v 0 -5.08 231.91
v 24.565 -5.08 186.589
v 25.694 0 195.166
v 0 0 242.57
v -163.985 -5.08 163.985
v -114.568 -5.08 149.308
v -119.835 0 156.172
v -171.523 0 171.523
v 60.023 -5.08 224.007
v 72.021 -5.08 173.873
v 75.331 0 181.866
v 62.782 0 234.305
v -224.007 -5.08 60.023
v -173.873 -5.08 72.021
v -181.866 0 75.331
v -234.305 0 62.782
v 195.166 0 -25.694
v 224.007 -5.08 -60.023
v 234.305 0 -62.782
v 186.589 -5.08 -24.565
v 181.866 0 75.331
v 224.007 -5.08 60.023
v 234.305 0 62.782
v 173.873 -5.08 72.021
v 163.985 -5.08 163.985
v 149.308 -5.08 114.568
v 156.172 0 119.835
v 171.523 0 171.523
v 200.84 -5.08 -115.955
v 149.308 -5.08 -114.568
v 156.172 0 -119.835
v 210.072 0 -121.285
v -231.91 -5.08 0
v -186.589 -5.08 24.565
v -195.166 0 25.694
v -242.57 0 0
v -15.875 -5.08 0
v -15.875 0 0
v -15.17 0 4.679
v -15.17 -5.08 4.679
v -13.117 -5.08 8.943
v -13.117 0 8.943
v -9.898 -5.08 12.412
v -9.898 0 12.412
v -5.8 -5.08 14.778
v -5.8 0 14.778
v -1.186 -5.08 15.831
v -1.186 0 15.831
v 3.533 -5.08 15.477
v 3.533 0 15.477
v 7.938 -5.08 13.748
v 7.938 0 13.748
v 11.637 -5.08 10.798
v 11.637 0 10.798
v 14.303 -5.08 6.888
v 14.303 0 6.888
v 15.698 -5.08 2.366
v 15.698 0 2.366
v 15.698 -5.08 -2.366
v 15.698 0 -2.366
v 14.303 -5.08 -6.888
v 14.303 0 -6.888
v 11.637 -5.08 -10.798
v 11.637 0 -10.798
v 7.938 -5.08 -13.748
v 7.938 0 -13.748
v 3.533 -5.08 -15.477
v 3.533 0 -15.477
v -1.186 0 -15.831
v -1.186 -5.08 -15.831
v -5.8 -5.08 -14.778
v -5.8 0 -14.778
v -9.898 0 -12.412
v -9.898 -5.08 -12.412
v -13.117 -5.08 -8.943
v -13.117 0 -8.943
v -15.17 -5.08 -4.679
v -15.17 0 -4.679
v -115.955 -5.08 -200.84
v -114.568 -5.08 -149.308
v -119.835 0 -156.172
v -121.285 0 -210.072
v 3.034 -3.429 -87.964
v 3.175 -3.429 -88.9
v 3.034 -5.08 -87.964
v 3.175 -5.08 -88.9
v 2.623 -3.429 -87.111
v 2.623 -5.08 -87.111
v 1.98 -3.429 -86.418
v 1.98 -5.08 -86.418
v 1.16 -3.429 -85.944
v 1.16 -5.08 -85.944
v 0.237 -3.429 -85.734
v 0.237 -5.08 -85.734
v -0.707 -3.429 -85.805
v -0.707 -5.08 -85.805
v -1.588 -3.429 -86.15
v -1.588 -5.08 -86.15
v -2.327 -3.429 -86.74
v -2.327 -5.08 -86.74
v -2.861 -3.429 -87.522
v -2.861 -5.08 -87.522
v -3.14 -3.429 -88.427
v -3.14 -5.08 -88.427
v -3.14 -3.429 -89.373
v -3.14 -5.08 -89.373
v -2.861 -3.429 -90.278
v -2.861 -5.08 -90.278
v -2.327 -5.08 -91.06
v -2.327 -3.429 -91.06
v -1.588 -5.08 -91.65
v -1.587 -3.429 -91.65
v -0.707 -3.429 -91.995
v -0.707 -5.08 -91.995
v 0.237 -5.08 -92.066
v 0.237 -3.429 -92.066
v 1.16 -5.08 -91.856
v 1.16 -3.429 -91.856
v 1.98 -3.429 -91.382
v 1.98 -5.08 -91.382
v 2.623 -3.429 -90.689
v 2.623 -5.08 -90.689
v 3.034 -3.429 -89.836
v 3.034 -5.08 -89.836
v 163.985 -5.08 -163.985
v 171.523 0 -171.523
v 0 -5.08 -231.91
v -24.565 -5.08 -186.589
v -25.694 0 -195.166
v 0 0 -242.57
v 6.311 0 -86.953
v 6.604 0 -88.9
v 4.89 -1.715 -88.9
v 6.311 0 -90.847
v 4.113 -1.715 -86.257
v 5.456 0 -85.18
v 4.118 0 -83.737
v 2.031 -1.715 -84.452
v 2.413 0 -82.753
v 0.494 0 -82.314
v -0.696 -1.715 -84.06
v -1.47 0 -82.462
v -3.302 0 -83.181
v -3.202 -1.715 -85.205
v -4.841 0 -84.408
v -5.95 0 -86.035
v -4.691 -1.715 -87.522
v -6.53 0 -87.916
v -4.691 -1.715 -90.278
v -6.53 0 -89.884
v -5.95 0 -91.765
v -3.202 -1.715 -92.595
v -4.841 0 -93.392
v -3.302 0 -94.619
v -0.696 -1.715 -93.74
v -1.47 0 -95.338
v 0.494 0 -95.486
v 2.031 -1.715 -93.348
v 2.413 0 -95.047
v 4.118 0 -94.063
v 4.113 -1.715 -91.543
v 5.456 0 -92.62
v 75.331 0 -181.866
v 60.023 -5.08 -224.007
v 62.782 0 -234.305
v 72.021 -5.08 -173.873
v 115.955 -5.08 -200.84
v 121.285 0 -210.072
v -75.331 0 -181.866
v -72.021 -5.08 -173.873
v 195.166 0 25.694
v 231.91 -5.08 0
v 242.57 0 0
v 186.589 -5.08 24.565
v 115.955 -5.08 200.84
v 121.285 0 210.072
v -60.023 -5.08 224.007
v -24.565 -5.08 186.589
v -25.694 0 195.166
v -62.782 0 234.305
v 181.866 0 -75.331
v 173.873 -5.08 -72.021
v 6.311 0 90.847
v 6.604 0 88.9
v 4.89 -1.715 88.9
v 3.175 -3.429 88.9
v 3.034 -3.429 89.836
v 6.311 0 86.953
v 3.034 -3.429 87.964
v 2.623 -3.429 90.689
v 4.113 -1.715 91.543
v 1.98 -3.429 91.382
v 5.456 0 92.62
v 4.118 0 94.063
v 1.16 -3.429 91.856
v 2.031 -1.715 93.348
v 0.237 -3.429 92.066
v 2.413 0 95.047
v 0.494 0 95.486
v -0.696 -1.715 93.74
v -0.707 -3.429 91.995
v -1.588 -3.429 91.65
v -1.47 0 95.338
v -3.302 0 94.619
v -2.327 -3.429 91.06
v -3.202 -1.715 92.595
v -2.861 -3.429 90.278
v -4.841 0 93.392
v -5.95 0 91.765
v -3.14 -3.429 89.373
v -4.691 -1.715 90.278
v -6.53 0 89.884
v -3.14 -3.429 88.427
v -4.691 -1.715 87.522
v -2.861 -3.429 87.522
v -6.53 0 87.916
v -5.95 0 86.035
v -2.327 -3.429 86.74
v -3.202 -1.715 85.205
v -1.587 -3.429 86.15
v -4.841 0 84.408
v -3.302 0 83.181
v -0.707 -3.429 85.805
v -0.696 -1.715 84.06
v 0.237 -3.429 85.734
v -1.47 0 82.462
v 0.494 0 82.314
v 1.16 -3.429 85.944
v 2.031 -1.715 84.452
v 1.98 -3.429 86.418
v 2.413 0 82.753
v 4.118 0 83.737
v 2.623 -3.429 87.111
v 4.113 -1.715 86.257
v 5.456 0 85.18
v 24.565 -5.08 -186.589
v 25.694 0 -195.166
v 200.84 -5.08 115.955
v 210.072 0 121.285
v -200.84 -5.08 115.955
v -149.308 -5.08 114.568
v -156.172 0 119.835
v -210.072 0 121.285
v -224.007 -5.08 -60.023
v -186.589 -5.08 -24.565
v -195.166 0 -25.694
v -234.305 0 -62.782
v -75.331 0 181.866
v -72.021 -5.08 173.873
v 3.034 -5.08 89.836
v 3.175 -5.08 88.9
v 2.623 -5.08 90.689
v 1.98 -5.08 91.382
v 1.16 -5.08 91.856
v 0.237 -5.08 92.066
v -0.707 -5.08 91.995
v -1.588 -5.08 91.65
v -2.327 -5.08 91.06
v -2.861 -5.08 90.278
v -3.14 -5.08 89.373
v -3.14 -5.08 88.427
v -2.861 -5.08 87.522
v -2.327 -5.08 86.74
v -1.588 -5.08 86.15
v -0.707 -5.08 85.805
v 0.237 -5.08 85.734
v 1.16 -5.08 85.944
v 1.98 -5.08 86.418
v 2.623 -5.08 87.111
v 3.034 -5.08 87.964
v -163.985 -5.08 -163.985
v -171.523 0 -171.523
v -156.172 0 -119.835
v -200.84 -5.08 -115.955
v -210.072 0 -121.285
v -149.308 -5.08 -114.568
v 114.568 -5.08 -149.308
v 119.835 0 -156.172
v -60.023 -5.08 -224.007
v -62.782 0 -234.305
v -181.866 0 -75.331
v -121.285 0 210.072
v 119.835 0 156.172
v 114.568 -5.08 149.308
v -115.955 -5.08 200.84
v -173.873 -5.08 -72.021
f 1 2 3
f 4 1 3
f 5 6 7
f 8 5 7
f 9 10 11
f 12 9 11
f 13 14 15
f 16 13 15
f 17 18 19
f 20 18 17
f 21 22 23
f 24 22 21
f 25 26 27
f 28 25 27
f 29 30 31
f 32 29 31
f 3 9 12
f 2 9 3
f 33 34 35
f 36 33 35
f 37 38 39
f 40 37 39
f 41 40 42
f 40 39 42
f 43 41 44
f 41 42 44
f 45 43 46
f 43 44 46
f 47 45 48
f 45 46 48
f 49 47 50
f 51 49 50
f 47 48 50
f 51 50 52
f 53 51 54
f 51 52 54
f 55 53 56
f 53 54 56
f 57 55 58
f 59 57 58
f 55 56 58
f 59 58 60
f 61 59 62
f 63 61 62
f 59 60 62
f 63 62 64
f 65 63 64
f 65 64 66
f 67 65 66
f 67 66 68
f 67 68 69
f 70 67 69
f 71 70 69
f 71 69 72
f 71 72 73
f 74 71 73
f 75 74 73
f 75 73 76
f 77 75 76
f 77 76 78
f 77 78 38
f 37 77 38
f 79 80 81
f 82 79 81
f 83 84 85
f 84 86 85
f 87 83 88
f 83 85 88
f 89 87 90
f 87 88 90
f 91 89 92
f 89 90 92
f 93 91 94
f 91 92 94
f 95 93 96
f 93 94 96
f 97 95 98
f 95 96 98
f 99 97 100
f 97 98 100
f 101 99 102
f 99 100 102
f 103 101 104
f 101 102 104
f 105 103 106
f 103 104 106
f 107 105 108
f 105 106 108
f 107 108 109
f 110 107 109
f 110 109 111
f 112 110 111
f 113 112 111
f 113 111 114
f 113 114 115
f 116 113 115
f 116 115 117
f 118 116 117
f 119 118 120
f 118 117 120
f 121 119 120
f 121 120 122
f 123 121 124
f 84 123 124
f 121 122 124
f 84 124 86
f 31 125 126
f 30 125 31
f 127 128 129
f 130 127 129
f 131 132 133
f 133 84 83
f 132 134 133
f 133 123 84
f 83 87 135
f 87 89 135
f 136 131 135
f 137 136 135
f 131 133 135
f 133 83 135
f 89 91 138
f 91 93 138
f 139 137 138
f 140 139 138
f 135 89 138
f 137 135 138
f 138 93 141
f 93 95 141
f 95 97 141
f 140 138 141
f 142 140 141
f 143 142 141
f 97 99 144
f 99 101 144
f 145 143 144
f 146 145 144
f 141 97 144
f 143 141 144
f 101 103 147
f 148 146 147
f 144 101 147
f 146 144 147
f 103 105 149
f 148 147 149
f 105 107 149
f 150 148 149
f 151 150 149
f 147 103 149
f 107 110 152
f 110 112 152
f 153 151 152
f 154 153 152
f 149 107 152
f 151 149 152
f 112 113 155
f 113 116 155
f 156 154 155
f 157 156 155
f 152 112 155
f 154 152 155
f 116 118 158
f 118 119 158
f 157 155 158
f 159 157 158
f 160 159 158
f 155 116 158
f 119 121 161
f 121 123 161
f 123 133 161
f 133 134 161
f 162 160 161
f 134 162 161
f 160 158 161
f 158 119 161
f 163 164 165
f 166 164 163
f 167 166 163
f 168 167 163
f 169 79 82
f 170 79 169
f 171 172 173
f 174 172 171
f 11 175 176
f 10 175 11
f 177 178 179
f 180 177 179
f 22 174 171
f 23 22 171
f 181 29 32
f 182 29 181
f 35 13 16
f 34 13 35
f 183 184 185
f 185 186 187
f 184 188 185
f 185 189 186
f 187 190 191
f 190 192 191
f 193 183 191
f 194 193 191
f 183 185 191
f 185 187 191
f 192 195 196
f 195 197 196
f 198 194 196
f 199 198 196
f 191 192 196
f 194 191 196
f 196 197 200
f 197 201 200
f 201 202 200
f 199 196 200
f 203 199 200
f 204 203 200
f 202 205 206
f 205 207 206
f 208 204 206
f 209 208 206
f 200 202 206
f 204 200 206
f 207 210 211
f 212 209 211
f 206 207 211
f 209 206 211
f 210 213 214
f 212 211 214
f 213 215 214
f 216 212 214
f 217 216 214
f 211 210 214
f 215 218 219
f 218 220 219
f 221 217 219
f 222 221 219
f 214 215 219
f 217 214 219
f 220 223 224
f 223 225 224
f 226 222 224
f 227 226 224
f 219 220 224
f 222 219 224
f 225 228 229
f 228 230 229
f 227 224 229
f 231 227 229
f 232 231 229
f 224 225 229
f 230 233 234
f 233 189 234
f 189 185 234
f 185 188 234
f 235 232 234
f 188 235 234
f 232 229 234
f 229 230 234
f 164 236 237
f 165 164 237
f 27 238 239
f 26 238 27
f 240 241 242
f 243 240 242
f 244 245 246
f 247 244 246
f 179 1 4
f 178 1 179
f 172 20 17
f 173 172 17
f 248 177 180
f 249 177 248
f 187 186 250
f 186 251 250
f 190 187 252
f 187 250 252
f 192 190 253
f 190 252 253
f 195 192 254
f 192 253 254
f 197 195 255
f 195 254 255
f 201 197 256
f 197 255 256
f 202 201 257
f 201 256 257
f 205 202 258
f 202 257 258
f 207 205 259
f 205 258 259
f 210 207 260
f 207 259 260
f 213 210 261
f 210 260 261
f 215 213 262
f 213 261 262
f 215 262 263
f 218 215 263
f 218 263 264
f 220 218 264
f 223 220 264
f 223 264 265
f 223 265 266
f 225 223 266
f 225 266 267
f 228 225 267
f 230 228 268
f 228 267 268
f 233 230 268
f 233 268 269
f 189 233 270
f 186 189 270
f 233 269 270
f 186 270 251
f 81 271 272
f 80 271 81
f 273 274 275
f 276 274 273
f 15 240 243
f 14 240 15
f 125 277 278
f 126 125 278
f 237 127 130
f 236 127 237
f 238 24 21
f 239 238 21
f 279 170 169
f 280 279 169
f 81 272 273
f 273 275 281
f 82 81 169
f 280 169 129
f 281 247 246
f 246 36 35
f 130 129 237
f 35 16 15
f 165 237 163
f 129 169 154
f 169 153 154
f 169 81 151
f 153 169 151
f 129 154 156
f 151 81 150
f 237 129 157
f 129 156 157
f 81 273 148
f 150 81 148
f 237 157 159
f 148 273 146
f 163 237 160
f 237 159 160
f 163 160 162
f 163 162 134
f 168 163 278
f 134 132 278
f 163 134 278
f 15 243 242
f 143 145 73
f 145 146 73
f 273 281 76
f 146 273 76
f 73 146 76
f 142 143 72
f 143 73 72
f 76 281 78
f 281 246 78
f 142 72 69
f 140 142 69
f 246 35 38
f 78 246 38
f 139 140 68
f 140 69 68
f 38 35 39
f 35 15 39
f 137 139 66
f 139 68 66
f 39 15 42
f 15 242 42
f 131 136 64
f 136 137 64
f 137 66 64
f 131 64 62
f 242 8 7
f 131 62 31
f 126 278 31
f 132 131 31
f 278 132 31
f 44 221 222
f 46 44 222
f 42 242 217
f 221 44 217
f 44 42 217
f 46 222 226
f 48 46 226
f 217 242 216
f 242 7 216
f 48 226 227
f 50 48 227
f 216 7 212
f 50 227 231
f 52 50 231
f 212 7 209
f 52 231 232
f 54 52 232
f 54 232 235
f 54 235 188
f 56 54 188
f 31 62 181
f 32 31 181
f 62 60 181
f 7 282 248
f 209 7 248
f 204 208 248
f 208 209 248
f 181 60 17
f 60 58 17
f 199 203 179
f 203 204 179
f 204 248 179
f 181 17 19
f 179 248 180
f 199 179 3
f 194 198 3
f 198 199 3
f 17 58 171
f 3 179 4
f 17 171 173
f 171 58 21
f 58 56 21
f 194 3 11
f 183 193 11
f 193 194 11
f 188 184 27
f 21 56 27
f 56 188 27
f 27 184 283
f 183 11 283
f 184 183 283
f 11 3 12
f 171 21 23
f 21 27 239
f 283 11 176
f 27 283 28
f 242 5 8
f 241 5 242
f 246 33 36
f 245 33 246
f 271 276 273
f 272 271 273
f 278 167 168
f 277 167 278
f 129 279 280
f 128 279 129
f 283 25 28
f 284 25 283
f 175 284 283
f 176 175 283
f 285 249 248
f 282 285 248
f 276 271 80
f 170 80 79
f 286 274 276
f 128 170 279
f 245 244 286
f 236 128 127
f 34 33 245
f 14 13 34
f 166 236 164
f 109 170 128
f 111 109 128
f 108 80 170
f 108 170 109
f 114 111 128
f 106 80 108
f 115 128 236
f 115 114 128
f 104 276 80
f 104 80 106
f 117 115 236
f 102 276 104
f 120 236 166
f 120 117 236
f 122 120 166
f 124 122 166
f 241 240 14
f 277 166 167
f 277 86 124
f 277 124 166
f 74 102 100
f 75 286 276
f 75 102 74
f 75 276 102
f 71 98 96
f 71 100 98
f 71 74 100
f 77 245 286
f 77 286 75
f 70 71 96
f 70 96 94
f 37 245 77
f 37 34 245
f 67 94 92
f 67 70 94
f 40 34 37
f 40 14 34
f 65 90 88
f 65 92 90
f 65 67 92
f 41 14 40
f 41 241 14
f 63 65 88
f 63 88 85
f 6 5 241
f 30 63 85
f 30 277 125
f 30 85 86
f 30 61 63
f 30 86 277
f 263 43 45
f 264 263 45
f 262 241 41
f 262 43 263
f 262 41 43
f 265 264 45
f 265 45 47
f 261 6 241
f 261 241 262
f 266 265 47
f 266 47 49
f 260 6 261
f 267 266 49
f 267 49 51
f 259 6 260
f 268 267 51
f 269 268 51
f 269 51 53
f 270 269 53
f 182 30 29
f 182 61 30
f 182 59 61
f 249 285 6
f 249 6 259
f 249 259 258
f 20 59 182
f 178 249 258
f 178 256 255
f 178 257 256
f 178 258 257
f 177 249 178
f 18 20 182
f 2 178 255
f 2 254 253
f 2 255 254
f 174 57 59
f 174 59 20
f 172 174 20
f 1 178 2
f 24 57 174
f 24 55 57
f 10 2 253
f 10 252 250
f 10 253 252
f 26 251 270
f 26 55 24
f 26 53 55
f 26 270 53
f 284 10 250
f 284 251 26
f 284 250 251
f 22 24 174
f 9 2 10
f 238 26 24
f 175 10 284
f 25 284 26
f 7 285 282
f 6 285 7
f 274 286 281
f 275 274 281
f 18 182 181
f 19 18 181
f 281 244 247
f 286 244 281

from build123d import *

# Parameters (mm, degrees)
F1_DEPTH       = 5.08
F2_SIZE        = 5.07999
F4_D           = 6.35
F4_CSINK_D     = 13.208
F4_CSINK_ANGLE = 90
F5_R           = 15.875
F6_DEPTH       = 25.4


# Not quite as in the source:
# - a fillet or chamfer is up to 0.001 mm smaller than in the source, because OpenCascade refuses the exact size


with BuildPart() as f1:
    # F0 (on Front) → F1 (new body)
    with BuildSketch(Plane.XZ):
        with BuildLine():
            ThreePointArc((181.8656859748, 75.3312336611), (190.142498905, 50.9485290284), (195.1659209614, 25.6940809385))
            Line((195.1659209614, 25.6940809385), (234.3046276829, 62.7817357705))
            Line((234.3046276829, 62.7817357705), (181.8656859748, 75.3312336611))
        make_face()
        with BuildLine():
            ThreePointArc((156.1716050363, 119.8346873004), (170.477100735, 98.425), (181.8656859748, 75.3312336611))
            Line((181.8656859748, 75.3312336611), (210.071782196, 121.285))
            Line((210.071782196, 121.285), (156.1716050363, 119.8346873004))
        make_face()
        with BuildLine():
            ThreePointArc((119.8346873004, 156.1716050363), (139.1939698766, 139.1939698766), (156.1716050363, 119.8346873004))
            Line((156.1716050363, 119.8346873004), (171.5228919124, 171.5228919124))
            Line((171.5228919124, 171.5228919124), (119.8346873004, 156.1716050363))
        make_face()
        with BuildLine():
            ThreePointArc((75.3312336611, 181.8656859748), (98.425, 170.477100735), (119.8346873004, 156.1716050363))
            Line((119.8346873004, 156.1716050363), (121.285, 210.071782196))
            Line((121.285, 210.071782196), (75.3312336611, 181.8656859748))
        make_face()
        with BuildLine():
            ThreePointArc((25.6940809385, 195.1659209614), (50.9485290284, 190.142498905), (75.3312336611, 181.8656859748))
            Line((75.3312336611, 181.8656859748), (62.7817357705, 234.3046276829))
            Line((62.7817357705, 234.3046276829), (25.6940809385, 195.1659209614))
        make_face()
        with BuildLine():
            ThreePointArc((-25.6940809385, 195.1659209614), (0, 196.85), (25.6940809385, 195.1659209614))
            Line((25.6940809385, 195.1659209614), (0, 242.57))
            Line((0, 242.57), (-25.6940809385, 195.1659209614))
        make_face()
        with BuildLine():
            ThreePointArc((-75.3312336611, 181.8656859748), (-50.9485290284, 190.142498905), (-25.6940809385, 195.1659209614))
            Line((-25.6940809385, 195.1659209614), (-62.7817357705, 234.3046276829))
            Line((-62.7817357705, 234.3046276829), (-75.3312336611, 181.8656859748))
        make_face()
        with BuildLine():
            ThreePointArc((-119.8346873004, 156.1716050363), (-98.425, 170.477100735), (-75.3312336611, 181.8656859748))
            Line((-75.3312336611, 181.8656859748), (-121.285, 210.071782196))
            Line((-121.285, 210.071782196), (-119.8346873004, 156.1716050363))
        make_face()
        with BuildLine():
            ThreePointArc((-156.1716050363, 119.8346873004), (-139.1939698766, 139.1939698766), (-119.8346873004, 156.1716050363))
            Line((-119.8346873004, 156.1716050363), (-171.5228919124, 171.5228919124))
            Line((-171.5228919124, 171.5228919124), (-156.1716050363, 119.8346873004))
        make_face()
        with BuildLine():
            ThreePointArc((-181.8656859748, 75.3312336611), (-170.477100735, 98.425), (-156.1716050363, 119.8346873004))
            Line((-156.1716050363, 119.8346873004), (-210.071782196, 121.285))
            Line((-210.071782196, 121.285), (-181.8656859748, 75.3312336611))
        make_face()
        with BuildLine():
            ThreePointArc((-195.1659209614, 25.6940809385), (-190.142498905, 50.9485290284), (-181.8656859748, 75.3312336611))
            Line((-181.8656859748, 75.3312336611), (-234.3046276829, 62.7817357705))
            Line((-234.3046276829, 62.7817357705), (-195.1659209614, 25.6940809385))
        make_face()
        with BuildLine():
            ThreePointArc((-195.1659209614, -25.6940809385), (-196.85, 0), (-195.1659209614, 25.6940809385))
            Line((-195.1659209614, 25.6940809385), (-242.57, 0))
            Line((-242.57, 0), (-195.1659209614, -25.6940809385))
        make_face()
        with BuildLine():
            Line((-234.3046276829, -62.7817357705), (-181.8656859748, -75.3312336611))
            ThreePointArc((-181.8656859748, -75.3312336611), (-190.142498905, -50.9485290284), (-195.1659209614, -25.6940809385))
            Line((-195.1659209614, -25.6940809385), (-234.3046276829, -62.7817357705))
        make_face()
        with BuildLine():
            Line((-210.071782196, -121.285), (-156.1716050363, -119.8346873004))
            ThreePointArc((-156.1716050363, -119.8346873004), (-170.477100735, -98.425), (-181.8656859748, -75.3312336611))
            Line((-181.8656859748, -75.3312336611), (-210.071782196, -121.285))
        make_face()
        with BuildLine():
            Line((-171.5228919124, -171.5228919124), (-119.8346873004, -156.1716050363))
            ThreePointArc((-119.8346873004, -156.1716050363), (-139.1939698766, -139.1939698766), (-156.1716050363, -119.8346873004))
            Line((-156.1716050363, -119.8346873004), (-171.5228919124, -171.5228919124))
        make_face()
        with BuildLine():
            Line((-121.285, -210.071782196), (-75.3312336611, -181.8656859748))
            ThreePointArc((-75.3312336611, -181.8656859748), (-98.425, -170.477100735), (-119.8346873004, -156.1716050363))
            Line((-119.8346873004, -156.1716050363), (-121.285, -210.071782196))
        make_face()
        with BuildLine():
            Line((-62.7817357705, -234.3046276829), (-25.6940809385, -195.1659209614))
            ThreePointArc((-25.6940809385, -195.1659209614), (-50.9485290284, -190.142498905), (-75.3312336611, -181.8656859748))
            Line((-75.3312336611, -181.8656859748), (-62.7817357705, -234.3046276829))
        make_face()
        with BuildLine():
            Line((0, -242.57), (25.6940809385, -195.1659209614))
            ThreePointArc((25.6940809385, -195.1659209614), (0, -196.85), (-25.6940809385, -195.1659209614))
            Line((-25.6940809385, -195.1659209614), (0, -242.57))
        make_face()
        with BuildLine():
            Line((62.7817357705, -234.3046276829), (75.3312336611, -181.8656859748))
            ThreePointArc((75.3312336611, -181.8656859748), (50.9485290284, -190.142498905), (25.6940809385, -195.1659209614))
            Line((25.6940809385, -195.1659209614), (62.7817357705, -234.3046276829))
        make_face()
        with BuildLine():
            Line((121.285, -210.071782196), (119.8346873004, -156.1716050363))
            ThreePointArc((119.8346873004, -156.1716050363), (98.425, -170.477100735), (75.3312336611, -181.8656859748))
            Line((75.3312336611, -181.8656859748), (121.285, -210.071782196))
        make_face()
        with BuildLine():
            Line((171.5228919124, -171.5228919124), (156.1716050363, -119.8346873004))
            ThreePointArc((156.1716050363, -119.8346873004), (139.1939698766, -139.1939698766), (119.8346873004, -156.1716050363))
            Line((119.8346873004, -156.1716050363), (171.5228919124, -171.5228919124))
        make_face()
        with BuildLine():
            Line((210.071782196, -121.285), (181.8656859748, -75.3312336611))
            ThreePointArc((181.8656859748, -75.3312336611), (170.477100735, -98.425), (156.1716050363, -119.8346873004))
            Line((156.1716050363, -119.8346873004), (210.071782196, -121.285))
        make_face()
        with BuildLine():
            Line((234.3046276829, -62.7817357705), (195.1659209614, -25.6940809385))
            ThreePointArc((195.1659209614, -25.6940809385), (190.142498905, -50.9485290284), (181.8656859748, -75.3312336611))
            Line((181.8656859748, -75.3312336611), (234.3046276829, -62.7817357705))
        make_face()
        with BuildLine():
            ThreePointArc((195.1659209614, 25.6940809385), (196.4285290395, 12.874605989), (196.85, 0))
            ThreePointArc((196.85, 0), (196.4285290395, -12.874605989), (195.1659209614, -25.6940809385))
            Line((195.1659209614, -25.6940809385), (242.57, 0))
            Line((242.57, 0), (195.1659209614, 25.6940809385))
        make_face()
        with BuildLine():
            ThreePointArc((195.1659209614, -25.6940809385), (196.4285290395, -12.874605989), (196.85, 0))
            ThreePointArc((196.85, 0), (196.4285290395, 12.874605989), (195.1659209614, 25.6940809385))
            ThreePointArc((195.1659209614, 25.6940809385), (190.142498905, 50.9485290284), (181.8656859748, 75.3312336611))
            ThreePointArc((181.8656859748, 75.3312336611), (170.477100735, 98.425), (156.1716050363, 119.8346873004))
            ThreePointArc((156.1716050363, 119.8346873004), (139.1939698766, 139.1939698766), (119.8346873004, 156.1716050363))
            ThreePointArc((119.8346873004, 156.1716050363), (98.425, 170.477100735), (75.3312336611, 181.8656859748))
            ThreePointArc((75.3312336611, 181.8656859748), (50.9485290284, 190.142498905), (25.6940809385, 195.1659209614))
            ThreePointArc((25.6940809385, 195.1659209614), (0, 196.85), (-25.6940809385, 195.1659209614))
            ThreePointArc((-25.6940809385, 195.1659209614), (-50.9485290284, 190.142498905), (-75.3312336611, 181.8656859748))
            ThreePointArc((-75.3312336611, 181.8656859748), (-98.425, 170.477100735), (-119.8346873004, 156.1716050363))
            ThreePointArc((-119.8346873004, 156.1716050363), (-139.1939698766, 139.1939698766), (-156.1716050363, 119.8346873004))
            ThreePointArc((-156.1716050363, 119.8346873004), (-170.477100735, 98.425), (-181.8656859748, 75.3312336611))
            ThreePointArc((-181.8656859748, 75.3312336611), (-190.142498905, 50.9485290284), (-195.1659209614, 25.6940809385))
            ThreePointArc((-195.1659209614, 25.6940809385), (-196.85, 0), (-195.1659209614, -25.6940809385))
            ThreePointArc((-195.1659209614, -25.6940809385), (-190.142498905, -50.9485290284), (-181.8656859748, -75.3312336611))
            ThreePointArc((-181.8656859748, -75.3312336611), (-170.477100735, -98.425), (-156.1716050363, -119.8346873004))
            ThreePointArc((-156.1716050363, -119.8346873004), (-139.1939698766, -139.1939698766), (-119.8346873004, -156.1716050363))
            ThreePointArc((-119.8346873004, -156.1716050363), (-98.425, -170.477100735), (-75.3312336611, -181.8656859748))
            ThreePointArc((-75.3312336611, -181.8656859748), (-50.9485290284, -190.142498905), (-25.6940809385, -195.1659209614))
            ThreePointArc((-25.6940809385, -195.1659209614), (0, -196.85), (25.6940809385, -195.1659209614))
            ThreePointArc((25.6940809385, -195.1659209614), (50.9485290284, -190.142498905), (75.3312336611, -181.8656859748))
            ThreePointArc((75.3312336611, -181.8656859748), (98.425, -170.477100735), (119.8346873004, -156.1716050363))
            ThreePointArc((119.8346873004, -156.1716050363), (139.1939698766, -139.1939698766), (156.1716050363, -119.8346873004))
            ThreePointArc((156.1716050363, -119.8346873004), (170.477100735, -98.425), (181.8656859748, -75.3312336611))
            ThreePointArc((181.8656859748, -75.3312336611), (190.142498905, -50.9485290284), (195.1659209614, -25.6940809385))
        make_face()
    extrude(amount=F1_DEPTH)

    # F2 (size 5.08 in the source; OpenCascade refuses exactly that, so slightly less here)
    f2_edges = [f1.edges().sort_by_distance(p)[0] for p in [
        (208.085157, -5.08, 69.056485),
        (195.968734, -5.08, 98.308117),
        (183.121694, -5.08, 120.559844),
        (163.847248, -5.08, 145.67879),
        (145.67879, -5.08, 163.847248),
        (120.559844, -5.08, 183.121694),
        (98.308117, -5.08, 195.968734),
        (69.056485, -5.08, 208.085157),
        (44.237908, -5.08, 214.735274),
        (12.84704, -5.08, 218.86796),
        (-12.84704, -5.08, 218.86796),
        (-44.237908, -5.08, 214.735274),
        (-69.056485, -5.08, 208.085157),
        (-98.308117, -5.08, 195.968734),
        (-120.559844, -5.08, 183.121694),
        (-145.67879, -5.08, 163.847248),
        (-163.847248, -5.08, 145.67879),
        (-183.121694, -5.08, 120.559844),
        (-195.968734, -5.08, 98.308117),
        (-208.085157, -5.08, 69.056485),
        (-214.735274, -5.08, 44.237908),
        (-218.86796, -5.08, 12.84704),
        (-218.86796, -5.08, -12.84704),
        (-214.735274, -5.08, -44.237908),
        (-208.085157, -5.08, -69.056485),
        (-195.968734, -5.08, -98.308117),
        (-183.121694, -5.08, -120.559844),
        (-163.847248, -5.08, -145.67879),
        (-145.67879, -5.08, -163.847248),
        (-120.559844, -5.08, -183.121694),
        (-98.308117, -5.08, -195.968734),
        (-69.056485, -5.08, -208.085157),
        (-44.237908, -5.08, -214.735274),
        (-12.84704, -5.08, -218.86796),
        (12.84704, -5.08, -218.86796),
        (44.237908, -5.08, -214.735274),
        (69.056485, -5.08, -208.085157),
        (98.308117, -5.08, -195.968734),
        (120.559844, -5.08, -183.121694),
        (145.67879, -5.08, -163.847248),
        (163.847248, -5.08, -145.67879),
        (183.121694, -5.08, -120.559844),
        (195.968734, -5.08, -98.308117),
        (208.085157, -5.08, -69.056485),
        (214.735274, -5.08, -44.237908),
        (218.86796, -5.08, -12.84704),
        (218.86796, -5.08, 12.84704),
        (214.735274, -5.08, 44.237908),
    ]]
    chamfer(f2_edges, length=F2_SIZE)

    # F4 (through all)
    with Locations(Plane(origin=(0, 0, 0), x_dir=(-1, 0, 0), z_dir=(0, 1, 0))):
        with Locations((0, 88.9), (0, -88.9)):
            CounterSinkHole(F4_D / 2, F4_CSINK_D / 2, counter_sink_angle=F4_CSINK_ANGLE)

    # F5 (on face) → F6 (cut)
    with BuildSketch(Plane(origin=(0, 0, 0), x_dir=(-1, 0, 0), z_dir=(0, 1, 0))):
        Circle(F5_R)
    extrude(amount=-F6_DEPTH, mode=Mode.SUBTRACT)


solid = f1.part
